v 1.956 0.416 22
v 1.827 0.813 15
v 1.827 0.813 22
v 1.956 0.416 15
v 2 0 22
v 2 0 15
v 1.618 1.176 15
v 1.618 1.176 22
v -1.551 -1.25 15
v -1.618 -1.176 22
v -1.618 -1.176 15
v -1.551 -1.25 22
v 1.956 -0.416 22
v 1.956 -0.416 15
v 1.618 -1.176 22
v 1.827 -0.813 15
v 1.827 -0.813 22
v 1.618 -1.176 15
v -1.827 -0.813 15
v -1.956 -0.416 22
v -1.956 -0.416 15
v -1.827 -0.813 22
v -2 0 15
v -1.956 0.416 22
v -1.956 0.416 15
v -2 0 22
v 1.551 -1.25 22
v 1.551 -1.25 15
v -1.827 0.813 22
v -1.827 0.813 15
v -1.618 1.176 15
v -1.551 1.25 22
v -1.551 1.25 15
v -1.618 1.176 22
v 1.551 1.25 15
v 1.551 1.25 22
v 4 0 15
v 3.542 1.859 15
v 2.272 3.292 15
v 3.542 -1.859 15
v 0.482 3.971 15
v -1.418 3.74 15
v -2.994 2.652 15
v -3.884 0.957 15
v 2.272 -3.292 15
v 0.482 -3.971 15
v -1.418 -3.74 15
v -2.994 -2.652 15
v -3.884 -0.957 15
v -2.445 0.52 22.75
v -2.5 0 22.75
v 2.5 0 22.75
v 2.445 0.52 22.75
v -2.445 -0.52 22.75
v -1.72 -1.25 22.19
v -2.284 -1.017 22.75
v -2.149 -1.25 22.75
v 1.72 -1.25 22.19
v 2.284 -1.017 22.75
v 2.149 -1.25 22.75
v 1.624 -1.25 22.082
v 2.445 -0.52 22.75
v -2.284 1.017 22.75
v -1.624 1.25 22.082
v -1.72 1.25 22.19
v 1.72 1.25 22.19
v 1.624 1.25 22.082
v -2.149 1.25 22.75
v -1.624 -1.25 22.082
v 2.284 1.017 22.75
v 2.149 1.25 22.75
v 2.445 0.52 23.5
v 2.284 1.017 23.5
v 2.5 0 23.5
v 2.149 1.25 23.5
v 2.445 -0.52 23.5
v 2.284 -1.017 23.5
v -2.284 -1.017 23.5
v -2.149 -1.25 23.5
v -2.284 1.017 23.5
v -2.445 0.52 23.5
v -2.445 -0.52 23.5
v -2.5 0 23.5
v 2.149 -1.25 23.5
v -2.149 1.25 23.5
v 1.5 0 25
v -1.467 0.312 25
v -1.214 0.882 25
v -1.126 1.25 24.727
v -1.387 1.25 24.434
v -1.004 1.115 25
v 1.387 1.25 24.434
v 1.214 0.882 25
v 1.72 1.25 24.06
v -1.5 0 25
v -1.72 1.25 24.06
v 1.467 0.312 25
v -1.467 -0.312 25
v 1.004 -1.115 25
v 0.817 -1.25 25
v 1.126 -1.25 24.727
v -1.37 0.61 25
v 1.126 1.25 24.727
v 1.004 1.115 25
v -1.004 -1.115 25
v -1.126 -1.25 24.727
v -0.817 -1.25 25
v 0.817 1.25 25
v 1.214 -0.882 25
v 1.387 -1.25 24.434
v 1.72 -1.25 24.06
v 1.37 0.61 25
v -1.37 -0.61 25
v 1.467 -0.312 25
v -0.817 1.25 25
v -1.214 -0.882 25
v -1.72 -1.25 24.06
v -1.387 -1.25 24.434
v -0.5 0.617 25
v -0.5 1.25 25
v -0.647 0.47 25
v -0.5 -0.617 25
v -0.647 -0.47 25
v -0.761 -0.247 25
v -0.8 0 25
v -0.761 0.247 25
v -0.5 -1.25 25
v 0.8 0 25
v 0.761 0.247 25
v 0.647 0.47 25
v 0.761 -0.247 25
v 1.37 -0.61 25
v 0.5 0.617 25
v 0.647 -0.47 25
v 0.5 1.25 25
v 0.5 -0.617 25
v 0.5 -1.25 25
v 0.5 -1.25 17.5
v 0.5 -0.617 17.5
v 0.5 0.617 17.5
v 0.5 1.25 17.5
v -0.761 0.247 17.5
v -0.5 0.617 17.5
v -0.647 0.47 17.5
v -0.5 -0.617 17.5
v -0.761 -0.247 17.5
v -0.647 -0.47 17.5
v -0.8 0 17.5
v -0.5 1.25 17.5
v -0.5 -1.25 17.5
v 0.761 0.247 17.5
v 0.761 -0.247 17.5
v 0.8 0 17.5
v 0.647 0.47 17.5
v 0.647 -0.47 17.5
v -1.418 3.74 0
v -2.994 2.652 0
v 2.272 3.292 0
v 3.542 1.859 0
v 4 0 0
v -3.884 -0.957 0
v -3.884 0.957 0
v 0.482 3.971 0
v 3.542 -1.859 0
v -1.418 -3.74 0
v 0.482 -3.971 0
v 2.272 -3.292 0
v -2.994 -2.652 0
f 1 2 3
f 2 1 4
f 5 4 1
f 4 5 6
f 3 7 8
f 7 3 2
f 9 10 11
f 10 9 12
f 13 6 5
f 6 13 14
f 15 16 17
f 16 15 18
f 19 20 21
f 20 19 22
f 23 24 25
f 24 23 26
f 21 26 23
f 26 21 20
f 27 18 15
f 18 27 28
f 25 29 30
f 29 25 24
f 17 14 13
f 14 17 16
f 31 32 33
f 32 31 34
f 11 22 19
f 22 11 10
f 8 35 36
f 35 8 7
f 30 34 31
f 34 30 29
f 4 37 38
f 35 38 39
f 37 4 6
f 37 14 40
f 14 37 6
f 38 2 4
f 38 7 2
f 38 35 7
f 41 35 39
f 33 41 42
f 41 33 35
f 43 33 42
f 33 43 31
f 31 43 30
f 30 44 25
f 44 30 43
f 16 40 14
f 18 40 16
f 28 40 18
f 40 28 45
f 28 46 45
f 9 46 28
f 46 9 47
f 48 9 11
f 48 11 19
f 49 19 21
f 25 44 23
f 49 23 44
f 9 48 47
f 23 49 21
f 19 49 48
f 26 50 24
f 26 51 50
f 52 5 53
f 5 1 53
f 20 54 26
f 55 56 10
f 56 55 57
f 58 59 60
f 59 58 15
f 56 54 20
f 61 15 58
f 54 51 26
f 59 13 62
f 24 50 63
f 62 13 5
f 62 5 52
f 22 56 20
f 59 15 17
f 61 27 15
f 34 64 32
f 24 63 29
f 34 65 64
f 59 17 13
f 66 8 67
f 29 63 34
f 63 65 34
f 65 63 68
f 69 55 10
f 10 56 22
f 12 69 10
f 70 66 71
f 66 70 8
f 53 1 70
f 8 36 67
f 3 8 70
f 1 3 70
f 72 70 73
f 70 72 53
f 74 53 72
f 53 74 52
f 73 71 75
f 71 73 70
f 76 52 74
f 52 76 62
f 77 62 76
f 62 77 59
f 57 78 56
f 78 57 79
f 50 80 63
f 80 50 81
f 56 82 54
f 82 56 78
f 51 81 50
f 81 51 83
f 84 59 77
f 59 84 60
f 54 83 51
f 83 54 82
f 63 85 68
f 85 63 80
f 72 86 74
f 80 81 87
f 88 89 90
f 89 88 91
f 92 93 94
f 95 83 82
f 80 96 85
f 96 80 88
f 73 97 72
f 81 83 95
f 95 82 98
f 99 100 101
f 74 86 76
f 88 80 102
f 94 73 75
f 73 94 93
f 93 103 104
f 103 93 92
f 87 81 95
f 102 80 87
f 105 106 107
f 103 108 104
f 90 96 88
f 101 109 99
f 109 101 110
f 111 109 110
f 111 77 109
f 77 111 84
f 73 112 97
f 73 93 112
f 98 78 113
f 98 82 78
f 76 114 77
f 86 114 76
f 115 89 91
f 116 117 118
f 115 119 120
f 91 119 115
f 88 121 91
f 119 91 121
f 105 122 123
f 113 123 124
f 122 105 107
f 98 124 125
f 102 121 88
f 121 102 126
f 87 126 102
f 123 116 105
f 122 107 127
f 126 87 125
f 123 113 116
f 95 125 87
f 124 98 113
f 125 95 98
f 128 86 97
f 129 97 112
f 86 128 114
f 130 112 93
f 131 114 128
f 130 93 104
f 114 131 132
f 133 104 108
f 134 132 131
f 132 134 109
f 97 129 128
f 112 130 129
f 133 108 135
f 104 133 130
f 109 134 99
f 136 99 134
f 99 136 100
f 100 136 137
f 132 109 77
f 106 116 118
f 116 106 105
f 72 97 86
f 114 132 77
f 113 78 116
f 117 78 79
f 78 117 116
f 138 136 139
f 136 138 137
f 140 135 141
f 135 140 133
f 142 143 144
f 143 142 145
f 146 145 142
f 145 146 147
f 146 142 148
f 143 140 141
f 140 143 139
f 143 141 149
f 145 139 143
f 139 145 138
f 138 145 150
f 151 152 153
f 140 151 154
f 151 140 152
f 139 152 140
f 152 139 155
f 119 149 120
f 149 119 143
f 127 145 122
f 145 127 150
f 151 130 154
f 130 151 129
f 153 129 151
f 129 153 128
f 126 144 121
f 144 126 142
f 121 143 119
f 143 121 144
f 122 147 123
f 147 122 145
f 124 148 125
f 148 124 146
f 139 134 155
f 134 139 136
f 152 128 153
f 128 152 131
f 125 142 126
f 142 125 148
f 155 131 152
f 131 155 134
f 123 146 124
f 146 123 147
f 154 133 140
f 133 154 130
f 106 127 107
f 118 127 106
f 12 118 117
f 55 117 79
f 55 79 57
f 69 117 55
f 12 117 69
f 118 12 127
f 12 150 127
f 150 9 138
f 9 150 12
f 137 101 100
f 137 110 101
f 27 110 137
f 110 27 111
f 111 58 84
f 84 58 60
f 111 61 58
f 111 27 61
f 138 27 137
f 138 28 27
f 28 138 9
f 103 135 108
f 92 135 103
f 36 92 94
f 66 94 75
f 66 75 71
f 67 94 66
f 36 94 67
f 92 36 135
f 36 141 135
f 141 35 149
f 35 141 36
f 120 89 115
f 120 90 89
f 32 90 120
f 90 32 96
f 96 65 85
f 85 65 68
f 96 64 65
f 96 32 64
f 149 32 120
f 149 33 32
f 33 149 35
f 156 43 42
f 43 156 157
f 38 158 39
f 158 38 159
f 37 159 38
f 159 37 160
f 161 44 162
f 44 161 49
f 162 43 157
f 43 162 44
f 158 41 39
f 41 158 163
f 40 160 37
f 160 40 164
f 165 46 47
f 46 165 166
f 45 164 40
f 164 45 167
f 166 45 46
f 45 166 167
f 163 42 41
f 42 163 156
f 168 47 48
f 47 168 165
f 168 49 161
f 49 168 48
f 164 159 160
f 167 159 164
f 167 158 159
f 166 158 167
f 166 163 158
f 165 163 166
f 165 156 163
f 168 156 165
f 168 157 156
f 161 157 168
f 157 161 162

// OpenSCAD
// Pin Connectors V2
// Tony Buser <tbuser@gmail.com>

// pinhole(h=5);

// test();
 pintack(h=10,r=2,bh=15,br=4);
// pinpeg(h=20);

module test() {
  tolerance = 0.3;
  
  translate([-12, 12, 0]) pinpeg(h=20);
  translate([12, 12, 0]) pintack(h=10);
  
  difference() {
    union() {
      translate([0, -12, 2.5]) cube(size = [59, 20, 5], center = true);
      translate([24, -12, 7.5]) cube(size = [12, 20, 15], center = true);
    }
    translate([-24, -12, 0]) pinhole(h=5, t=tolerance);
    translate([-12, -12, 0]) pinhole(h=5, t=tolerance, tight=false);
    translate([0, -12, 0]) pinhole(h=10, t=tolerance);
    translate([12, -12, 0]) pinhole(h=10, t=tolerance, tight=false);
    translate([24, -12, 15]) rotate([0, 180, 0]) pinhole(h=10, t=tolerance);
  }
}

module pinhole(h=10, r=4, lh=3, lt=1, t=0.3, tight=true) {
  // h = shaft height
  // r = shaft radius
  // lh = lip height
  // lt = lip thickness
  // t = tolerance
  // tight = set to false if you want a joint that spins easily
  
  union() {
    pin_solid(h, r+(t/2), lh, lt);
    cylinder(h=h+0.2, r=r);
    // widen the cylinder slightly
    // cylinder(h=h+0.2, r=r+(t-0.2/2));
    if (tight == false) {
      cylinder(h=h+0.2, r=r+(t/2)+0.25);
    }
    // widen the entrance hole to make insertion easier
    translate([0, 0, -0.1]) cylinder(h=lh/3, r2=r, r1=r+(t/2)+(lt/2));
  }
}

module pin(h=10, r=4, lh=3, lt=1, side=false) {
  // h = shaft height
  // r = shaft radius
  // lh = lip height
  // lt = lip thickness
  // side = set to true if you want it printed horizontally

  if (side) {
    pin_horizontal(h, r, lh, lt);
  } else {
    pin_vertical(h, r, lh, lt);
  }
}

module pintack(h=10, r=4, lh=3, lt=1, bh=3, br=8.75) {
  // bh = base_height
  // br = base_radius
  
  union() {
    cylinder(h=bh, r=br);
    translate([0, 0, bh]) pin(h, r, lh, lt);
  }
}

module pinpeg(h=20, r=4, lh=3, lt=1) {
  union() {
    translate([0, -h/4+0.05, 0]) pin(h/2+0.1, r, lh, lt, side=true);
    translate([0, h/4-0.05, 0]) rotate([0, 0, 180]) pin(h/2+0.1, r, lh, lt, side=true);
  }
}

// just call pin instead, I made this module because it was easier to do the rotation option this way
// since openscad complains of recursion if I did it all in one module
module pin_vertical(h=10, r=4, lh=3, lt=1) {
  // h = shaft height
  // r = shaft radius
  // lh = lip height
  // lt = lip thickness

  difference() {
    pin_solid(h, r, lh, lt);
    
    // center cut
    translate([-r*0.5/2, -(r*2+lt*2)/2, h/4]) cube([r*0.5, r*2+lt*2, h]);
    translate([0, 0, h/4]) cylinder(h=h+lh, r=r/2.5, $fn=20);
    // center curve
    // translate([0, 0, h/4]) rotate([90, 0, 0]) cylinder(h=r*2, r=r*0.5/2, center=true, $fn=20);
  
    // side cuts
    translate([-r*2, -lt-r*1.125, -1]) cube([r*4, lt*2, h+2]);
    translate([-r*2, -lt+r*1.125, -1]) cube([r*4, lt*2, h+2]);
  }
}

// call pin with side=true instead of this
module pin_horizontal(h=10, r=4, lh=3, lt=1) {
  // h = shaft height
  // r = shaft radius
  // lh = lip height
  // lt = lip thickness
  translate([0, h/2, r*1.125-lt]) rotate([90, 0, 0]) pin_vertical(h, r, lh, lt);
}

// this is mainly to make the pinhole module easier
module pin_solid(h=10, r=4, lh=3, lt=1) {
  union() {
    // shaft
    cylinder(h=h-lh, r=r, $fn=30);
    // lip
    // translate([0, 0, h-lh]) cylinder(h=lh*0.25, r1=r, r2=r+(lt/2), $fn=30);
    // translate([0, 0, h-lh+lh*0.25]) cylinder(h=lh*0.25, r2=r, r1=r+(lt/2), $fn=30);
    // translate([0, 0, h-lh+lh*0.50]) cylinder(h=lh*0.50, r1=r, r2=r-(lt/2), $fn=30);

    // translate([0, 0, h-lh]) cylinder(h=lh*0.50, r1=r, r2=r+(lt/2), $fn=30);
    // translate([0, 0, h-lh+lh*0.50]) cylinder(h=lh*0.50, r1=r+(lt/2), r2=r-(lt/3), $fn=30);    

    translate([0, 0, h-lh]) cylinder(h=lh*0.25, r1=r, r2=r+(lt/2), $fn=30);
    translate([0, 0, h-lh+lh*0.25]) cylinder(h=lh*0.25, r=r+(lt/2), $fn=30);    
    translate([0, 0, h-lh+lh*0.50]) cylinder(h=lh*0.50, r1=r+(lt/2), r2=r-(lt/2), $fn=30);    

    // translate([0, 0, h-lh]) cylinder(h=lh, r1=r+(lt/2), r2=1, $fn=30);
    // translate([0, 0, h-lh-lt/2]) cylinder(h=lt/2, r1=r, r2=r+(lt/2), $fn=30);
  }
}
